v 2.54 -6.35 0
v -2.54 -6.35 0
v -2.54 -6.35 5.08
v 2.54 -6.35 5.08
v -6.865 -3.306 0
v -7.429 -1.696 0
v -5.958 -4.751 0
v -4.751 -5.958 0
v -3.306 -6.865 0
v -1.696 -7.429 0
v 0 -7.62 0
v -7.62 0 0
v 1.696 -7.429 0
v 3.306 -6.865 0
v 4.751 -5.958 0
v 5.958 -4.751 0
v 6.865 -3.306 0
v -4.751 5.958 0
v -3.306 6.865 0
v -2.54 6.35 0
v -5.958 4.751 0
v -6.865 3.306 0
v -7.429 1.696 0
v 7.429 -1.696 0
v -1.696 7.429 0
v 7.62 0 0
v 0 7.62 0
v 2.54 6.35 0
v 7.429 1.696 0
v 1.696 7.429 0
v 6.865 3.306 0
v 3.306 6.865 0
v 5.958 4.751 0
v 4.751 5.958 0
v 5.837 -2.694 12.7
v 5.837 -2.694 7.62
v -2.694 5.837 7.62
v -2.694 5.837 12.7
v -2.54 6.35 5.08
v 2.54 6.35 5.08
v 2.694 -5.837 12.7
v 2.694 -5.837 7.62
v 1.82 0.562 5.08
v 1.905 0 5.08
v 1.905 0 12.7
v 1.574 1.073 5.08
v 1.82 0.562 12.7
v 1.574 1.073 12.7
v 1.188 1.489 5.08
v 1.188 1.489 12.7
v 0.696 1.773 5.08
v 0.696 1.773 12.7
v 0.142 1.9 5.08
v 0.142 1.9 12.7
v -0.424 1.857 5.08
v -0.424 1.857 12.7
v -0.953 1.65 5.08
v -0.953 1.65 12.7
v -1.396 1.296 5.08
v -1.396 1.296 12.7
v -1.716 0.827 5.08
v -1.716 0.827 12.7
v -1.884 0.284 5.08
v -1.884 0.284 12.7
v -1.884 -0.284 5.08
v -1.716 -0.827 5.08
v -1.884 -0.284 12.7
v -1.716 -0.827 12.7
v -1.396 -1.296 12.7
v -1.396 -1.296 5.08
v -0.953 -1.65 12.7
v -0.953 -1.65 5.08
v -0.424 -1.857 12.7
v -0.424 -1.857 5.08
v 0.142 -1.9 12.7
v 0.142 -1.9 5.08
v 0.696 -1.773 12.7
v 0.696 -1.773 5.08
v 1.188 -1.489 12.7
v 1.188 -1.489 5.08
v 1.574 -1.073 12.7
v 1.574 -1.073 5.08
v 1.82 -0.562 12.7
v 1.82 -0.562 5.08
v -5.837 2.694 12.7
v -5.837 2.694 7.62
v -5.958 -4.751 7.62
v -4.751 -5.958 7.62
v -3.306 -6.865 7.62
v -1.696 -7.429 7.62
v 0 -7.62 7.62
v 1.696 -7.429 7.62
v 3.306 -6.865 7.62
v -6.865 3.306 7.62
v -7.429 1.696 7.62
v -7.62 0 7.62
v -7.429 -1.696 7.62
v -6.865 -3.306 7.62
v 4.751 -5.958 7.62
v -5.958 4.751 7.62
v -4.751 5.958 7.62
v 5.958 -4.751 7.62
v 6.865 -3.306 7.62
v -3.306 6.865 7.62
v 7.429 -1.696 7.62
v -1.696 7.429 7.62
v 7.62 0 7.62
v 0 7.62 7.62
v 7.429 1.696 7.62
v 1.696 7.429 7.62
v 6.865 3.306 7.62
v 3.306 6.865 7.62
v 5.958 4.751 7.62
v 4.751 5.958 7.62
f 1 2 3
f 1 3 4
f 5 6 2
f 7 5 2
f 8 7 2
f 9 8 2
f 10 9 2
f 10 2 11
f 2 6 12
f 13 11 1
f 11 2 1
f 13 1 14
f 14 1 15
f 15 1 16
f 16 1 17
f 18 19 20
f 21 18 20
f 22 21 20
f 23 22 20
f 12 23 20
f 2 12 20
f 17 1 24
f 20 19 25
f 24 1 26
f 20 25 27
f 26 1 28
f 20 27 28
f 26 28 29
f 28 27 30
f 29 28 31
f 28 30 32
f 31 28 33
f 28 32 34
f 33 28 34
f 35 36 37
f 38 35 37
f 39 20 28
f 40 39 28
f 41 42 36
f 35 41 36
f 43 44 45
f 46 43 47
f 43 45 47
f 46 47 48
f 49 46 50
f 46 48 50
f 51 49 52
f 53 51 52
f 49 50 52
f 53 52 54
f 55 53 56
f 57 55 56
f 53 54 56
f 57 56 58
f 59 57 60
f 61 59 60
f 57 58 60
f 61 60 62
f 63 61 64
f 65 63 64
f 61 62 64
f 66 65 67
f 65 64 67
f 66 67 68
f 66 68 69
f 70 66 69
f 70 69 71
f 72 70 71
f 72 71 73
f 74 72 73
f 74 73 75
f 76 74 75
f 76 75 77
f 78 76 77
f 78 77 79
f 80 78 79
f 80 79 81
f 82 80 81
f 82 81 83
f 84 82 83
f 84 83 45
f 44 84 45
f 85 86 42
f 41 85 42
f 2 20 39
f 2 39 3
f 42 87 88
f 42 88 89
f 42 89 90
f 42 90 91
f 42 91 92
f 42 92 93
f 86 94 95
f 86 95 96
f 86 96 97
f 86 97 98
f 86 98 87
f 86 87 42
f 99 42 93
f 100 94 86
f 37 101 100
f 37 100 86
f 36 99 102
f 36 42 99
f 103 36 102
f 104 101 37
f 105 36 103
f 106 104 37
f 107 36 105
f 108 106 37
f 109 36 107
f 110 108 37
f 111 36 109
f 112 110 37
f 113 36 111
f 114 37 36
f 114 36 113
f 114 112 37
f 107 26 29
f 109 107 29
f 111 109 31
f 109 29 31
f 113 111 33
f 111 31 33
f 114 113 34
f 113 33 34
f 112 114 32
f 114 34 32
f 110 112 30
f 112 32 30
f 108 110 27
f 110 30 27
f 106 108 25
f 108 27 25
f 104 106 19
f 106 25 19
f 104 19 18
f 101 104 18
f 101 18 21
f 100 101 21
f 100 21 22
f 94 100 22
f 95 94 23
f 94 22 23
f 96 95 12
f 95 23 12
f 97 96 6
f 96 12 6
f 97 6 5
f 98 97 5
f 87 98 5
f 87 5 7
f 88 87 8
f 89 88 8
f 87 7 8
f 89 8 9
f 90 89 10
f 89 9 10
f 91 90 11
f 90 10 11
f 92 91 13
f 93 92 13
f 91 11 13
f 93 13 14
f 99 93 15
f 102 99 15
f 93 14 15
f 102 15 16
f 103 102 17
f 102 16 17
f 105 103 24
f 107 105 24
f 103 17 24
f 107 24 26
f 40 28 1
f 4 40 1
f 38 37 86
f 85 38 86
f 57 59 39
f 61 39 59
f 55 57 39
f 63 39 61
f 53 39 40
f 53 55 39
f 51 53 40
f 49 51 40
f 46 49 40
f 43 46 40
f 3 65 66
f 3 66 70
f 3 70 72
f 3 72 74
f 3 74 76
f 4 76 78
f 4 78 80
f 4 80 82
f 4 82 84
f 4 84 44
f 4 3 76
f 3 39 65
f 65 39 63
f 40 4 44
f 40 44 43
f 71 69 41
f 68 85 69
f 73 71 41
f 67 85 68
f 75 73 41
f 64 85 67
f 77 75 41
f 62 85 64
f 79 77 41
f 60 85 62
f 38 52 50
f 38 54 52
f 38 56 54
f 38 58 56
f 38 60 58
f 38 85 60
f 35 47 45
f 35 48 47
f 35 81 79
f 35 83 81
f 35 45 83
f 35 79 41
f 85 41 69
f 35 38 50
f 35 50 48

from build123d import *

# Parameters (mm, degrees)
F0_R     = 7.62
F1_DEPTH = 7.62
F2_W     = 5.08
F2_H     = 12.7
F3_DEPTH = 5.08
F5_DEPTH = 5.08
F6_R     = 1.905
F7_DEPTH = 12.701


with BuildPart() as f1:
    # F0 (on Top) → F1 (new body)
    with BuildSketch(Plane.XY):
        Circle(F0_R)
    extrude(amount=F1_DEPTH)

    # F2 (on face) → F3 (cut)
    with BuildSketch(Plane(origin=(0, 0, 0), x_dir=(1, 0, 0), z_dir=(0, 0, -1))):
        Rectangle(F2_W, F2_H)
    extrude(amount=-F3_DEPTH, mode=Mode.SUBTRACT)

    # F4 (on face) → F5 (join)
    with BuildSketch(Plane.XY.offset(7.62)):
        Polygon((-2.694077, 5.837166), (-5.837166, 2.694077), (2.694077, -5.837166), (5.837166, -2.694077), align=None)
    extrude(amount=F5_DEPTH)

    # F6 (on face) → F7 (cut, through all)
    with BuildSketch(Plane.XY.offset(12.7)):
        Circle(F6_R)
    extrude(amount=-F7_DEPTH, mode=Mode.SUBTRACT)


solid = f1.part
